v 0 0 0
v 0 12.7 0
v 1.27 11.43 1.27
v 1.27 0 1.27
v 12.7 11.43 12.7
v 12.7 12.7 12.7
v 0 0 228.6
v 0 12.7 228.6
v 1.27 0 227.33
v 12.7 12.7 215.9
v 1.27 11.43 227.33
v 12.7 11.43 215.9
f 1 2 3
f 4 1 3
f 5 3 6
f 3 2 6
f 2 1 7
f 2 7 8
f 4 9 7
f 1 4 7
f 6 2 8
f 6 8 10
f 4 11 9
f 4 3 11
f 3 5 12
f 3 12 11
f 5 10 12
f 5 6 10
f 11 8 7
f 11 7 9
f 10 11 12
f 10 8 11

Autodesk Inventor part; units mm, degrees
ref_plane "YZ Plane" through (0, 0, 0) normal (1, 0, 0) x (0, 1, 0)
ref_plane "XZ Plane" through (0, 0, 0) normal (0, 1, 0) x (-1, 0, 0)
ref_plane "XY Plane" through (0, 0, 0) normal (0, 0, 1) x (1, 0, 0)
sketch "Sketch1" plane through (0, 0, 0) normal (0, 0, 1) x (1, 0, 0)
  line L0 (0, 0) -> (0, 12.7)
  line L1 (0, 12.7) -> (12.7, 12.7)
  line L2 (12.7, 12.7) -> (12.7, 11.43)
  line L3 (12.7, 11.43) -> (1.27, 11.43)
  line L4 (1.27, 11.43) -> (1.27, 0)
  line L5 (1.27, 0) -> (0, 0)
  dimension "d0" = 12.7
  dimension "d1" = 12.7
  dimension "d2" = 1.27
  dimension "d3" = 11.43
extrude "Extrusion1" add sketch "Sketch1" along normal blind 228.6
sketch "Sketch2" plane through (0, 12.7, 0) normal (0, 1, 0) x (1, 0, 0)
  line L0 (0, 0) -> (12.7, 0) projected
  line L1 (12.7, -228.6) -> (0, -228.6) projected
  line L2 (12.7, 0) -> (12.7, -228.6) projected
  line L3 (0, -228.6) -> (12.7, -215.9)
  line L4 (0, 0) -> (12.7, -12.7)
  dimension "d6" = 45
  dimension "d7" = 45
extrude "Extrusion2" cut sketch "Sketch2" against normal blind 228.6
properties part number "Aluminum Angle 2" material "Aluminum 6061"
